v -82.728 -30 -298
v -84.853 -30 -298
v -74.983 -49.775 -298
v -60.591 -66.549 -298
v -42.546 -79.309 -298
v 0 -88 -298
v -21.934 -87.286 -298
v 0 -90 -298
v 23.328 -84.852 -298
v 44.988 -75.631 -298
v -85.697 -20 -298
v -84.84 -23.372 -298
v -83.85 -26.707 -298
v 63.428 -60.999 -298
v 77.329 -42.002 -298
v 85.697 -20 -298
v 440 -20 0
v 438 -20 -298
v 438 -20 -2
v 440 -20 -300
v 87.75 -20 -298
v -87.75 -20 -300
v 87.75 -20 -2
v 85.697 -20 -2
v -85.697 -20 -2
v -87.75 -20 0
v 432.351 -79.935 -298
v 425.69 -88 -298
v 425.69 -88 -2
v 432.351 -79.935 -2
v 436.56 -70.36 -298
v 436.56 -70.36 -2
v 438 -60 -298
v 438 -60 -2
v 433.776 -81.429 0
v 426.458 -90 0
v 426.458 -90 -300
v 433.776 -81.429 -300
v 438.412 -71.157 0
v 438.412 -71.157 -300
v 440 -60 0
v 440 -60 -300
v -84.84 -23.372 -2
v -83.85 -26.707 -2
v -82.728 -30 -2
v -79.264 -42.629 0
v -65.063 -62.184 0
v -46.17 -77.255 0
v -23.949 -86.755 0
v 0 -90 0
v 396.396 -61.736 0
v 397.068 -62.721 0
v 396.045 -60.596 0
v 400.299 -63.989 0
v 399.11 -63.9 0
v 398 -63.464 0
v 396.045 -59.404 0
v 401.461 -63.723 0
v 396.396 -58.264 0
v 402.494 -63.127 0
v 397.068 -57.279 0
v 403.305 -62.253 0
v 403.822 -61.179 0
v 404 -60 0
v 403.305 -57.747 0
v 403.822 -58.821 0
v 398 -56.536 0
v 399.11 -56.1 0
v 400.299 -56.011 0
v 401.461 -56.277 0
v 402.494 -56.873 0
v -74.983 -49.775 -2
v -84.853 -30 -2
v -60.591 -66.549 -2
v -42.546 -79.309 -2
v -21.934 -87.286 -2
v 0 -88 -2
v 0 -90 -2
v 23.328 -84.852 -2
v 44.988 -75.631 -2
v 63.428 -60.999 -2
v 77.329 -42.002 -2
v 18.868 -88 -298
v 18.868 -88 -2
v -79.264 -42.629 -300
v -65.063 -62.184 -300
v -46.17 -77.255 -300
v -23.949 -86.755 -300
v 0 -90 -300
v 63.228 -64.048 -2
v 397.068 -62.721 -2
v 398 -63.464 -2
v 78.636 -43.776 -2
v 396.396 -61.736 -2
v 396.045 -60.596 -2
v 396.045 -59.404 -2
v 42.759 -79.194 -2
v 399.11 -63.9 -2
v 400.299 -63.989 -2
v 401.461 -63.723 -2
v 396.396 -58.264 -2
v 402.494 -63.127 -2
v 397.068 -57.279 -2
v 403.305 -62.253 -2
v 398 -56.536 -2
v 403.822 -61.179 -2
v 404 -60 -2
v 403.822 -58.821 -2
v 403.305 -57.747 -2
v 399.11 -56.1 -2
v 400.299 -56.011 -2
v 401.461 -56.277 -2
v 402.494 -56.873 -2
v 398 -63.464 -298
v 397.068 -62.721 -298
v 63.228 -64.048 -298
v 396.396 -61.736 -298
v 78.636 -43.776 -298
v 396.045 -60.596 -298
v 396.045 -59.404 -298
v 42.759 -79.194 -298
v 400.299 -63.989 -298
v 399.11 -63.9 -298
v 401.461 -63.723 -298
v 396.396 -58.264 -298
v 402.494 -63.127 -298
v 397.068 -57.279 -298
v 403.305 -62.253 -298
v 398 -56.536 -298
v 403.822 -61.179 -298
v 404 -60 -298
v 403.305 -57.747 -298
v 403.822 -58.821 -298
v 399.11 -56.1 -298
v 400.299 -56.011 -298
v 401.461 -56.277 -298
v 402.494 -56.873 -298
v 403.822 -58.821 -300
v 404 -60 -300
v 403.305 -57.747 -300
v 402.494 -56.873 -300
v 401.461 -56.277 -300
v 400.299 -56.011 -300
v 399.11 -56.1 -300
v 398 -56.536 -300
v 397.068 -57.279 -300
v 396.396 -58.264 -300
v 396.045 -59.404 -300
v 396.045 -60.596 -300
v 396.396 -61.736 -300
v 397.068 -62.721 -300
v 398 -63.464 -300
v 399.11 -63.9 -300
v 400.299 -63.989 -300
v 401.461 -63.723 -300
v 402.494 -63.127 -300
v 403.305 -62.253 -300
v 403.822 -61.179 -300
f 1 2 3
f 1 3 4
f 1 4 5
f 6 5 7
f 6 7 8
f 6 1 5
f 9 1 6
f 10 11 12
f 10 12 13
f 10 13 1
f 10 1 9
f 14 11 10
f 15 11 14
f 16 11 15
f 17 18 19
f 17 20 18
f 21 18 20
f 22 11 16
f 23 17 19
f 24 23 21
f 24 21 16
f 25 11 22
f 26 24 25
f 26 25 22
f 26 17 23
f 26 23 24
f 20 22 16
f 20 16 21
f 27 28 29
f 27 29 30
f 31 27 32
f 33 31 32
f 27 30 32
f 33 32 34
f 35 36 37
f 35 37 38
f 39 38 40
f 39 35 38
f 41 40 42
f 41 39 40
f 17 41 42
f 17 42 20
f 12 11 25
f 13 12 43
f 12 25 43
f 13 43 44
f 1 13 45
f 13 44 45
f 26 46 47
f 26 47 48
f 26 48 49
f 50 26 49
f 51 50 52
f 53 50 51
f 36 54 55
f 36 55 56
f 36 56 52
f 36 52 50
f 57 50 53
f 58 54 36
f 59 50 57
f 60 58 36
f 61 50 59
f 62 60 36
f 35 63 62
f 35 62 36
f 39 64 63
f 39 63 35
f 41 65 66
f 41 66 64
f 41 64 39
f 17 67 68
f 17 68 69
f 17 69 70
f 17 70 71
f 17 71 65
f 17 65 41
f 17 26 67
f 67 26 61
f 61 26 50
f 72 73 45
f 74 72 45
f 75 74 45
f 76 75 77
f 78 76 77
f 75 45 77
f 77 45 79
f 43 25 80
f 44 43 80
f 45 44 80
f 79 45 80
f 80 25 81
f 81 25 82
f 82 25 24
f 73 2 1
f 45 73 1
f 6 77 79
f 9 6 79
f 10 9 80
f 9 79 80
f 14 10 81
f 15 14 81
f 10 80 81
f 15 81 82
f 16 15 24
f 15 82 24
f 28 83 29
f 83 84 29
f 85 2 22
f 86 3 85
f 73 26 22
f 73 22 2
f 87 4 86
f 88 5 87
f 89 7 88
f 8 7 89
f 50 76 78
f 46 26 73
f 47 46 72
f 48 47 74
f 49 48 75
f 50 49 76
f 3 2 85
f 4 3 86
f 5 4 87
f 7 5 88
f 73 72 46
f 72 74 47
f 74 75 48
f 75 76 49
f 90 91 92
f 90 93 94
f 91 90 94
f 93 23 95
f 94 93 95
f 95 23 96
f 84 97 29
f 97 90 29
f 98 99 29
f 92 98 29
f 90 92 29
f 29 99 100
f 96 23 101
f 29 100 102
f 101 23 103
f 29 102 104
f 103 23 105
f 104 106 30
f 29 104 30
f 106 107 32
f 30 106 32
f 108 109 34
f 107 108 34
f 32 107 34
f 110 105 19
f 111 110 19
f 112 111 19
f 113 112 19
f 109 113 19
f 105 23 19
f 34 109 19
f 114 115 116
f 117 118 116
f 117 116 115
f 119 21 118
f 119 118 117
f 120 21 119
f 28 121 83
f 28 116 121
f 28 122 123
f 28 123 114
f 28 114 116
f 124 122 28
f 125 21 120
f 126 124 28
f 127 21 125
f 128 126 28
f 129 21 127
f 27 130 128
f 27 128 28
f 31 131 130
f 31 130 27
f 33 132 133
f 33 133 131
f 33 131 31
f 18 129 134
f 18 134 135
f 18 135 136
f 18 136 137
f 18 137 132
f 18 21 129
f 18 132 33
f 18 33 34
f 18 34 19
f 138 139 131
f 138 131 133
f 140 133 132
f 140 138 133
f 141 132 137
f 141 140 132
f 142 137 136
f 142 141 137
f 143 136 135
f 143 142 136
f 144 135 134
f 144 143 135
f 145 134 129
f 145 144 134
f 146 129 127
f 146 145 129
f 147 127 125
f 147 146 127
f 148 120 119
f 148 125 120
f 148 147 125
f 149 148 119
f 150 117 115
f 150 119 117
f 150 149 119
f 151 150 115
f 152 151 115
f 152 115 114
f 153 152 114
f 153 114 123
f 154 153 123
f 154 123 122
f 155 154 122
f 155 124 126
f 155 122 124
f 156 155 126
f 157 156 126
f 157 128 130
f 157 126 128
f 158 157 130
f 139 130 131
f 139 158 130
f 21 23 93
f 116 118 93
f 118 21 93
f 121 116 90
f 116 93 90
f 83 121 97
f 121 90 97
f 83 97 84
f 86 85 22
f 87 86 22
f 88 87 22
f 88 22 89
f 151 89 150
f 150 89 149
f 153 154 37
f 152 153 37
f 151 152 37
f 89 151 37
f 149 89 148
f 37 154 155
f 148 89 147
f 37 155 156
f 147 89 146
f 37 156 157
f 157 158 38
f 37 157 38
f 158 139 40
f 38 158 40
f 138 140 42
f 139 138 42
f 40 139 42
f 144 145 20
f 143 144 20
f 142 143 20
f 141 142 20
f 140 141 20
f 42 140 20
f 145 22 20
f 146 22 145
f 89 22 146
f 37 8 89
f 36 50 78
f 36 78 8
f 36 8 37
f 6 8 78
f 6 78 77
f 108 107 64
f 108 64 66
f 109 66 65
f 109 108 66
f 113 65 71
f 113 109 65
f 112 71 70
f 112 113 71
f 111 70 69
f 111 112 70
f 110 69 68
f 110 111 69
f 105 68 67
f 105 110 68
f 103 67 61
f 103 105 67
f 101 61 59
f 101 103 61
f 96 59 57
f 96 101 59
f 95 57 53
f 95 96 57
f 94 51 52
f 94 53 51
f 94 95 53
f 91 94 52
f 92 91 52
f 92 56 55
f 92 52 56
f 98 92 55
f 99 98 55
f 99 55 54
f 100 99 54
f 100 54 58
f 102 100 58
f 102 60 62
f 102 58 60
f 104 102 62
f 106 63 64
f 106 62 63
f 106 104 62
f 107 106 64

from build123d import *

# Parameters (mm, degrees)
EXTRUDE_1_DEPTH          = 300
SHELL_1_T                = -2
SKETCH_3_W               = 101.211387706
SKETCH_3_H               = 60
CUT_EXTRUDE_1_DEPTH      = 296
EXTRUDE_2_DEPTH          = 300
CUT_EXTRUDE_2_DEPTH      = 541.092584656
CUT_EXTRUDE_2_DEPTH_BACK = 541.092584656
SKETCH_6_R               = 4


with BuildPart() as part:
    # 草图1 → 凸台-拉伸1 (new body)
    with BuildSketch(Plane.XY):
        with BuildLine():
            Line((-22.839294621, -20), (-87.749643874, -20))
            ThreePointArc((-87.749643874, -20), (-56.124860802, -70.356236397), (0, -90))
            Line((0, -90), (400, -90))
            Line((400, -90), (426.457513111, -90))
            ThreePointArc((426.457513111, -90), (436.457513111, -76.457513111), (440, -60))
            Line((440, -60), (440, -20))
            Line((440, -20), (400, -20))
            Line((400, -20), (-22.839294621, -20))
        make_face()
    extrude(amount=-EXTRUDE_1_DEPTH)

    # 抽壳1
    shell_1_openings = [part.faces().sort_by_distance(p)[0] for p in [
        (176.125178063, -20, -150),
    ]]
    offset(amount=SHELL_1_T, openings=shell_1_openings, kind=Kind.INTERSECTION)

    # 草图3 → 切除-拉伸1 (cut)
    with BuildSketch(Plane.XY.offset(-298)):
        with Locations((-50.605693853, -60)):
            Rectangle(SKETCH_3_W, SKETCH_3_H)
    extrude(amount=CUT_EXTRUDE_1_DEPTH, mode=Mode.SUBTRACT)

    # 草图4 → 凸台-拉伸2 (add)
    with BuildSketch(Plane.XY):
        with BuildLine():
            Line((85.697141143, -20), (87.749643874, -20))
            ThreePointArc((87.749643874, -20), (56.124860802, -70.356236397), (0, -90))
            Line((0, -90), (0, -88))
            ThreePointArc((0, -88), (54.699177325, -68.934751758), (85.697141143, -20))
        make_face()
    extrude(amount=-EXTRUDE_2_DEPTH)

    # 草图6 → 切除-拉伸2 (cut, two sides: drawn at the far end of the back side and taken through both)
    with BuildSketch(Plane.XY.offset(-CUT_EXTRUDE_2_DEPTH_BACK)):
        with Locations((400, -60)):
            Circle(SKETCH_6_R)
    extrude(amount=CUT_EXTRUDE_2_DEPTH + CUT_EXTRUDE_2_DEPTH_BACK, mode=Mode.SUBTRACT)


solid = part.part
